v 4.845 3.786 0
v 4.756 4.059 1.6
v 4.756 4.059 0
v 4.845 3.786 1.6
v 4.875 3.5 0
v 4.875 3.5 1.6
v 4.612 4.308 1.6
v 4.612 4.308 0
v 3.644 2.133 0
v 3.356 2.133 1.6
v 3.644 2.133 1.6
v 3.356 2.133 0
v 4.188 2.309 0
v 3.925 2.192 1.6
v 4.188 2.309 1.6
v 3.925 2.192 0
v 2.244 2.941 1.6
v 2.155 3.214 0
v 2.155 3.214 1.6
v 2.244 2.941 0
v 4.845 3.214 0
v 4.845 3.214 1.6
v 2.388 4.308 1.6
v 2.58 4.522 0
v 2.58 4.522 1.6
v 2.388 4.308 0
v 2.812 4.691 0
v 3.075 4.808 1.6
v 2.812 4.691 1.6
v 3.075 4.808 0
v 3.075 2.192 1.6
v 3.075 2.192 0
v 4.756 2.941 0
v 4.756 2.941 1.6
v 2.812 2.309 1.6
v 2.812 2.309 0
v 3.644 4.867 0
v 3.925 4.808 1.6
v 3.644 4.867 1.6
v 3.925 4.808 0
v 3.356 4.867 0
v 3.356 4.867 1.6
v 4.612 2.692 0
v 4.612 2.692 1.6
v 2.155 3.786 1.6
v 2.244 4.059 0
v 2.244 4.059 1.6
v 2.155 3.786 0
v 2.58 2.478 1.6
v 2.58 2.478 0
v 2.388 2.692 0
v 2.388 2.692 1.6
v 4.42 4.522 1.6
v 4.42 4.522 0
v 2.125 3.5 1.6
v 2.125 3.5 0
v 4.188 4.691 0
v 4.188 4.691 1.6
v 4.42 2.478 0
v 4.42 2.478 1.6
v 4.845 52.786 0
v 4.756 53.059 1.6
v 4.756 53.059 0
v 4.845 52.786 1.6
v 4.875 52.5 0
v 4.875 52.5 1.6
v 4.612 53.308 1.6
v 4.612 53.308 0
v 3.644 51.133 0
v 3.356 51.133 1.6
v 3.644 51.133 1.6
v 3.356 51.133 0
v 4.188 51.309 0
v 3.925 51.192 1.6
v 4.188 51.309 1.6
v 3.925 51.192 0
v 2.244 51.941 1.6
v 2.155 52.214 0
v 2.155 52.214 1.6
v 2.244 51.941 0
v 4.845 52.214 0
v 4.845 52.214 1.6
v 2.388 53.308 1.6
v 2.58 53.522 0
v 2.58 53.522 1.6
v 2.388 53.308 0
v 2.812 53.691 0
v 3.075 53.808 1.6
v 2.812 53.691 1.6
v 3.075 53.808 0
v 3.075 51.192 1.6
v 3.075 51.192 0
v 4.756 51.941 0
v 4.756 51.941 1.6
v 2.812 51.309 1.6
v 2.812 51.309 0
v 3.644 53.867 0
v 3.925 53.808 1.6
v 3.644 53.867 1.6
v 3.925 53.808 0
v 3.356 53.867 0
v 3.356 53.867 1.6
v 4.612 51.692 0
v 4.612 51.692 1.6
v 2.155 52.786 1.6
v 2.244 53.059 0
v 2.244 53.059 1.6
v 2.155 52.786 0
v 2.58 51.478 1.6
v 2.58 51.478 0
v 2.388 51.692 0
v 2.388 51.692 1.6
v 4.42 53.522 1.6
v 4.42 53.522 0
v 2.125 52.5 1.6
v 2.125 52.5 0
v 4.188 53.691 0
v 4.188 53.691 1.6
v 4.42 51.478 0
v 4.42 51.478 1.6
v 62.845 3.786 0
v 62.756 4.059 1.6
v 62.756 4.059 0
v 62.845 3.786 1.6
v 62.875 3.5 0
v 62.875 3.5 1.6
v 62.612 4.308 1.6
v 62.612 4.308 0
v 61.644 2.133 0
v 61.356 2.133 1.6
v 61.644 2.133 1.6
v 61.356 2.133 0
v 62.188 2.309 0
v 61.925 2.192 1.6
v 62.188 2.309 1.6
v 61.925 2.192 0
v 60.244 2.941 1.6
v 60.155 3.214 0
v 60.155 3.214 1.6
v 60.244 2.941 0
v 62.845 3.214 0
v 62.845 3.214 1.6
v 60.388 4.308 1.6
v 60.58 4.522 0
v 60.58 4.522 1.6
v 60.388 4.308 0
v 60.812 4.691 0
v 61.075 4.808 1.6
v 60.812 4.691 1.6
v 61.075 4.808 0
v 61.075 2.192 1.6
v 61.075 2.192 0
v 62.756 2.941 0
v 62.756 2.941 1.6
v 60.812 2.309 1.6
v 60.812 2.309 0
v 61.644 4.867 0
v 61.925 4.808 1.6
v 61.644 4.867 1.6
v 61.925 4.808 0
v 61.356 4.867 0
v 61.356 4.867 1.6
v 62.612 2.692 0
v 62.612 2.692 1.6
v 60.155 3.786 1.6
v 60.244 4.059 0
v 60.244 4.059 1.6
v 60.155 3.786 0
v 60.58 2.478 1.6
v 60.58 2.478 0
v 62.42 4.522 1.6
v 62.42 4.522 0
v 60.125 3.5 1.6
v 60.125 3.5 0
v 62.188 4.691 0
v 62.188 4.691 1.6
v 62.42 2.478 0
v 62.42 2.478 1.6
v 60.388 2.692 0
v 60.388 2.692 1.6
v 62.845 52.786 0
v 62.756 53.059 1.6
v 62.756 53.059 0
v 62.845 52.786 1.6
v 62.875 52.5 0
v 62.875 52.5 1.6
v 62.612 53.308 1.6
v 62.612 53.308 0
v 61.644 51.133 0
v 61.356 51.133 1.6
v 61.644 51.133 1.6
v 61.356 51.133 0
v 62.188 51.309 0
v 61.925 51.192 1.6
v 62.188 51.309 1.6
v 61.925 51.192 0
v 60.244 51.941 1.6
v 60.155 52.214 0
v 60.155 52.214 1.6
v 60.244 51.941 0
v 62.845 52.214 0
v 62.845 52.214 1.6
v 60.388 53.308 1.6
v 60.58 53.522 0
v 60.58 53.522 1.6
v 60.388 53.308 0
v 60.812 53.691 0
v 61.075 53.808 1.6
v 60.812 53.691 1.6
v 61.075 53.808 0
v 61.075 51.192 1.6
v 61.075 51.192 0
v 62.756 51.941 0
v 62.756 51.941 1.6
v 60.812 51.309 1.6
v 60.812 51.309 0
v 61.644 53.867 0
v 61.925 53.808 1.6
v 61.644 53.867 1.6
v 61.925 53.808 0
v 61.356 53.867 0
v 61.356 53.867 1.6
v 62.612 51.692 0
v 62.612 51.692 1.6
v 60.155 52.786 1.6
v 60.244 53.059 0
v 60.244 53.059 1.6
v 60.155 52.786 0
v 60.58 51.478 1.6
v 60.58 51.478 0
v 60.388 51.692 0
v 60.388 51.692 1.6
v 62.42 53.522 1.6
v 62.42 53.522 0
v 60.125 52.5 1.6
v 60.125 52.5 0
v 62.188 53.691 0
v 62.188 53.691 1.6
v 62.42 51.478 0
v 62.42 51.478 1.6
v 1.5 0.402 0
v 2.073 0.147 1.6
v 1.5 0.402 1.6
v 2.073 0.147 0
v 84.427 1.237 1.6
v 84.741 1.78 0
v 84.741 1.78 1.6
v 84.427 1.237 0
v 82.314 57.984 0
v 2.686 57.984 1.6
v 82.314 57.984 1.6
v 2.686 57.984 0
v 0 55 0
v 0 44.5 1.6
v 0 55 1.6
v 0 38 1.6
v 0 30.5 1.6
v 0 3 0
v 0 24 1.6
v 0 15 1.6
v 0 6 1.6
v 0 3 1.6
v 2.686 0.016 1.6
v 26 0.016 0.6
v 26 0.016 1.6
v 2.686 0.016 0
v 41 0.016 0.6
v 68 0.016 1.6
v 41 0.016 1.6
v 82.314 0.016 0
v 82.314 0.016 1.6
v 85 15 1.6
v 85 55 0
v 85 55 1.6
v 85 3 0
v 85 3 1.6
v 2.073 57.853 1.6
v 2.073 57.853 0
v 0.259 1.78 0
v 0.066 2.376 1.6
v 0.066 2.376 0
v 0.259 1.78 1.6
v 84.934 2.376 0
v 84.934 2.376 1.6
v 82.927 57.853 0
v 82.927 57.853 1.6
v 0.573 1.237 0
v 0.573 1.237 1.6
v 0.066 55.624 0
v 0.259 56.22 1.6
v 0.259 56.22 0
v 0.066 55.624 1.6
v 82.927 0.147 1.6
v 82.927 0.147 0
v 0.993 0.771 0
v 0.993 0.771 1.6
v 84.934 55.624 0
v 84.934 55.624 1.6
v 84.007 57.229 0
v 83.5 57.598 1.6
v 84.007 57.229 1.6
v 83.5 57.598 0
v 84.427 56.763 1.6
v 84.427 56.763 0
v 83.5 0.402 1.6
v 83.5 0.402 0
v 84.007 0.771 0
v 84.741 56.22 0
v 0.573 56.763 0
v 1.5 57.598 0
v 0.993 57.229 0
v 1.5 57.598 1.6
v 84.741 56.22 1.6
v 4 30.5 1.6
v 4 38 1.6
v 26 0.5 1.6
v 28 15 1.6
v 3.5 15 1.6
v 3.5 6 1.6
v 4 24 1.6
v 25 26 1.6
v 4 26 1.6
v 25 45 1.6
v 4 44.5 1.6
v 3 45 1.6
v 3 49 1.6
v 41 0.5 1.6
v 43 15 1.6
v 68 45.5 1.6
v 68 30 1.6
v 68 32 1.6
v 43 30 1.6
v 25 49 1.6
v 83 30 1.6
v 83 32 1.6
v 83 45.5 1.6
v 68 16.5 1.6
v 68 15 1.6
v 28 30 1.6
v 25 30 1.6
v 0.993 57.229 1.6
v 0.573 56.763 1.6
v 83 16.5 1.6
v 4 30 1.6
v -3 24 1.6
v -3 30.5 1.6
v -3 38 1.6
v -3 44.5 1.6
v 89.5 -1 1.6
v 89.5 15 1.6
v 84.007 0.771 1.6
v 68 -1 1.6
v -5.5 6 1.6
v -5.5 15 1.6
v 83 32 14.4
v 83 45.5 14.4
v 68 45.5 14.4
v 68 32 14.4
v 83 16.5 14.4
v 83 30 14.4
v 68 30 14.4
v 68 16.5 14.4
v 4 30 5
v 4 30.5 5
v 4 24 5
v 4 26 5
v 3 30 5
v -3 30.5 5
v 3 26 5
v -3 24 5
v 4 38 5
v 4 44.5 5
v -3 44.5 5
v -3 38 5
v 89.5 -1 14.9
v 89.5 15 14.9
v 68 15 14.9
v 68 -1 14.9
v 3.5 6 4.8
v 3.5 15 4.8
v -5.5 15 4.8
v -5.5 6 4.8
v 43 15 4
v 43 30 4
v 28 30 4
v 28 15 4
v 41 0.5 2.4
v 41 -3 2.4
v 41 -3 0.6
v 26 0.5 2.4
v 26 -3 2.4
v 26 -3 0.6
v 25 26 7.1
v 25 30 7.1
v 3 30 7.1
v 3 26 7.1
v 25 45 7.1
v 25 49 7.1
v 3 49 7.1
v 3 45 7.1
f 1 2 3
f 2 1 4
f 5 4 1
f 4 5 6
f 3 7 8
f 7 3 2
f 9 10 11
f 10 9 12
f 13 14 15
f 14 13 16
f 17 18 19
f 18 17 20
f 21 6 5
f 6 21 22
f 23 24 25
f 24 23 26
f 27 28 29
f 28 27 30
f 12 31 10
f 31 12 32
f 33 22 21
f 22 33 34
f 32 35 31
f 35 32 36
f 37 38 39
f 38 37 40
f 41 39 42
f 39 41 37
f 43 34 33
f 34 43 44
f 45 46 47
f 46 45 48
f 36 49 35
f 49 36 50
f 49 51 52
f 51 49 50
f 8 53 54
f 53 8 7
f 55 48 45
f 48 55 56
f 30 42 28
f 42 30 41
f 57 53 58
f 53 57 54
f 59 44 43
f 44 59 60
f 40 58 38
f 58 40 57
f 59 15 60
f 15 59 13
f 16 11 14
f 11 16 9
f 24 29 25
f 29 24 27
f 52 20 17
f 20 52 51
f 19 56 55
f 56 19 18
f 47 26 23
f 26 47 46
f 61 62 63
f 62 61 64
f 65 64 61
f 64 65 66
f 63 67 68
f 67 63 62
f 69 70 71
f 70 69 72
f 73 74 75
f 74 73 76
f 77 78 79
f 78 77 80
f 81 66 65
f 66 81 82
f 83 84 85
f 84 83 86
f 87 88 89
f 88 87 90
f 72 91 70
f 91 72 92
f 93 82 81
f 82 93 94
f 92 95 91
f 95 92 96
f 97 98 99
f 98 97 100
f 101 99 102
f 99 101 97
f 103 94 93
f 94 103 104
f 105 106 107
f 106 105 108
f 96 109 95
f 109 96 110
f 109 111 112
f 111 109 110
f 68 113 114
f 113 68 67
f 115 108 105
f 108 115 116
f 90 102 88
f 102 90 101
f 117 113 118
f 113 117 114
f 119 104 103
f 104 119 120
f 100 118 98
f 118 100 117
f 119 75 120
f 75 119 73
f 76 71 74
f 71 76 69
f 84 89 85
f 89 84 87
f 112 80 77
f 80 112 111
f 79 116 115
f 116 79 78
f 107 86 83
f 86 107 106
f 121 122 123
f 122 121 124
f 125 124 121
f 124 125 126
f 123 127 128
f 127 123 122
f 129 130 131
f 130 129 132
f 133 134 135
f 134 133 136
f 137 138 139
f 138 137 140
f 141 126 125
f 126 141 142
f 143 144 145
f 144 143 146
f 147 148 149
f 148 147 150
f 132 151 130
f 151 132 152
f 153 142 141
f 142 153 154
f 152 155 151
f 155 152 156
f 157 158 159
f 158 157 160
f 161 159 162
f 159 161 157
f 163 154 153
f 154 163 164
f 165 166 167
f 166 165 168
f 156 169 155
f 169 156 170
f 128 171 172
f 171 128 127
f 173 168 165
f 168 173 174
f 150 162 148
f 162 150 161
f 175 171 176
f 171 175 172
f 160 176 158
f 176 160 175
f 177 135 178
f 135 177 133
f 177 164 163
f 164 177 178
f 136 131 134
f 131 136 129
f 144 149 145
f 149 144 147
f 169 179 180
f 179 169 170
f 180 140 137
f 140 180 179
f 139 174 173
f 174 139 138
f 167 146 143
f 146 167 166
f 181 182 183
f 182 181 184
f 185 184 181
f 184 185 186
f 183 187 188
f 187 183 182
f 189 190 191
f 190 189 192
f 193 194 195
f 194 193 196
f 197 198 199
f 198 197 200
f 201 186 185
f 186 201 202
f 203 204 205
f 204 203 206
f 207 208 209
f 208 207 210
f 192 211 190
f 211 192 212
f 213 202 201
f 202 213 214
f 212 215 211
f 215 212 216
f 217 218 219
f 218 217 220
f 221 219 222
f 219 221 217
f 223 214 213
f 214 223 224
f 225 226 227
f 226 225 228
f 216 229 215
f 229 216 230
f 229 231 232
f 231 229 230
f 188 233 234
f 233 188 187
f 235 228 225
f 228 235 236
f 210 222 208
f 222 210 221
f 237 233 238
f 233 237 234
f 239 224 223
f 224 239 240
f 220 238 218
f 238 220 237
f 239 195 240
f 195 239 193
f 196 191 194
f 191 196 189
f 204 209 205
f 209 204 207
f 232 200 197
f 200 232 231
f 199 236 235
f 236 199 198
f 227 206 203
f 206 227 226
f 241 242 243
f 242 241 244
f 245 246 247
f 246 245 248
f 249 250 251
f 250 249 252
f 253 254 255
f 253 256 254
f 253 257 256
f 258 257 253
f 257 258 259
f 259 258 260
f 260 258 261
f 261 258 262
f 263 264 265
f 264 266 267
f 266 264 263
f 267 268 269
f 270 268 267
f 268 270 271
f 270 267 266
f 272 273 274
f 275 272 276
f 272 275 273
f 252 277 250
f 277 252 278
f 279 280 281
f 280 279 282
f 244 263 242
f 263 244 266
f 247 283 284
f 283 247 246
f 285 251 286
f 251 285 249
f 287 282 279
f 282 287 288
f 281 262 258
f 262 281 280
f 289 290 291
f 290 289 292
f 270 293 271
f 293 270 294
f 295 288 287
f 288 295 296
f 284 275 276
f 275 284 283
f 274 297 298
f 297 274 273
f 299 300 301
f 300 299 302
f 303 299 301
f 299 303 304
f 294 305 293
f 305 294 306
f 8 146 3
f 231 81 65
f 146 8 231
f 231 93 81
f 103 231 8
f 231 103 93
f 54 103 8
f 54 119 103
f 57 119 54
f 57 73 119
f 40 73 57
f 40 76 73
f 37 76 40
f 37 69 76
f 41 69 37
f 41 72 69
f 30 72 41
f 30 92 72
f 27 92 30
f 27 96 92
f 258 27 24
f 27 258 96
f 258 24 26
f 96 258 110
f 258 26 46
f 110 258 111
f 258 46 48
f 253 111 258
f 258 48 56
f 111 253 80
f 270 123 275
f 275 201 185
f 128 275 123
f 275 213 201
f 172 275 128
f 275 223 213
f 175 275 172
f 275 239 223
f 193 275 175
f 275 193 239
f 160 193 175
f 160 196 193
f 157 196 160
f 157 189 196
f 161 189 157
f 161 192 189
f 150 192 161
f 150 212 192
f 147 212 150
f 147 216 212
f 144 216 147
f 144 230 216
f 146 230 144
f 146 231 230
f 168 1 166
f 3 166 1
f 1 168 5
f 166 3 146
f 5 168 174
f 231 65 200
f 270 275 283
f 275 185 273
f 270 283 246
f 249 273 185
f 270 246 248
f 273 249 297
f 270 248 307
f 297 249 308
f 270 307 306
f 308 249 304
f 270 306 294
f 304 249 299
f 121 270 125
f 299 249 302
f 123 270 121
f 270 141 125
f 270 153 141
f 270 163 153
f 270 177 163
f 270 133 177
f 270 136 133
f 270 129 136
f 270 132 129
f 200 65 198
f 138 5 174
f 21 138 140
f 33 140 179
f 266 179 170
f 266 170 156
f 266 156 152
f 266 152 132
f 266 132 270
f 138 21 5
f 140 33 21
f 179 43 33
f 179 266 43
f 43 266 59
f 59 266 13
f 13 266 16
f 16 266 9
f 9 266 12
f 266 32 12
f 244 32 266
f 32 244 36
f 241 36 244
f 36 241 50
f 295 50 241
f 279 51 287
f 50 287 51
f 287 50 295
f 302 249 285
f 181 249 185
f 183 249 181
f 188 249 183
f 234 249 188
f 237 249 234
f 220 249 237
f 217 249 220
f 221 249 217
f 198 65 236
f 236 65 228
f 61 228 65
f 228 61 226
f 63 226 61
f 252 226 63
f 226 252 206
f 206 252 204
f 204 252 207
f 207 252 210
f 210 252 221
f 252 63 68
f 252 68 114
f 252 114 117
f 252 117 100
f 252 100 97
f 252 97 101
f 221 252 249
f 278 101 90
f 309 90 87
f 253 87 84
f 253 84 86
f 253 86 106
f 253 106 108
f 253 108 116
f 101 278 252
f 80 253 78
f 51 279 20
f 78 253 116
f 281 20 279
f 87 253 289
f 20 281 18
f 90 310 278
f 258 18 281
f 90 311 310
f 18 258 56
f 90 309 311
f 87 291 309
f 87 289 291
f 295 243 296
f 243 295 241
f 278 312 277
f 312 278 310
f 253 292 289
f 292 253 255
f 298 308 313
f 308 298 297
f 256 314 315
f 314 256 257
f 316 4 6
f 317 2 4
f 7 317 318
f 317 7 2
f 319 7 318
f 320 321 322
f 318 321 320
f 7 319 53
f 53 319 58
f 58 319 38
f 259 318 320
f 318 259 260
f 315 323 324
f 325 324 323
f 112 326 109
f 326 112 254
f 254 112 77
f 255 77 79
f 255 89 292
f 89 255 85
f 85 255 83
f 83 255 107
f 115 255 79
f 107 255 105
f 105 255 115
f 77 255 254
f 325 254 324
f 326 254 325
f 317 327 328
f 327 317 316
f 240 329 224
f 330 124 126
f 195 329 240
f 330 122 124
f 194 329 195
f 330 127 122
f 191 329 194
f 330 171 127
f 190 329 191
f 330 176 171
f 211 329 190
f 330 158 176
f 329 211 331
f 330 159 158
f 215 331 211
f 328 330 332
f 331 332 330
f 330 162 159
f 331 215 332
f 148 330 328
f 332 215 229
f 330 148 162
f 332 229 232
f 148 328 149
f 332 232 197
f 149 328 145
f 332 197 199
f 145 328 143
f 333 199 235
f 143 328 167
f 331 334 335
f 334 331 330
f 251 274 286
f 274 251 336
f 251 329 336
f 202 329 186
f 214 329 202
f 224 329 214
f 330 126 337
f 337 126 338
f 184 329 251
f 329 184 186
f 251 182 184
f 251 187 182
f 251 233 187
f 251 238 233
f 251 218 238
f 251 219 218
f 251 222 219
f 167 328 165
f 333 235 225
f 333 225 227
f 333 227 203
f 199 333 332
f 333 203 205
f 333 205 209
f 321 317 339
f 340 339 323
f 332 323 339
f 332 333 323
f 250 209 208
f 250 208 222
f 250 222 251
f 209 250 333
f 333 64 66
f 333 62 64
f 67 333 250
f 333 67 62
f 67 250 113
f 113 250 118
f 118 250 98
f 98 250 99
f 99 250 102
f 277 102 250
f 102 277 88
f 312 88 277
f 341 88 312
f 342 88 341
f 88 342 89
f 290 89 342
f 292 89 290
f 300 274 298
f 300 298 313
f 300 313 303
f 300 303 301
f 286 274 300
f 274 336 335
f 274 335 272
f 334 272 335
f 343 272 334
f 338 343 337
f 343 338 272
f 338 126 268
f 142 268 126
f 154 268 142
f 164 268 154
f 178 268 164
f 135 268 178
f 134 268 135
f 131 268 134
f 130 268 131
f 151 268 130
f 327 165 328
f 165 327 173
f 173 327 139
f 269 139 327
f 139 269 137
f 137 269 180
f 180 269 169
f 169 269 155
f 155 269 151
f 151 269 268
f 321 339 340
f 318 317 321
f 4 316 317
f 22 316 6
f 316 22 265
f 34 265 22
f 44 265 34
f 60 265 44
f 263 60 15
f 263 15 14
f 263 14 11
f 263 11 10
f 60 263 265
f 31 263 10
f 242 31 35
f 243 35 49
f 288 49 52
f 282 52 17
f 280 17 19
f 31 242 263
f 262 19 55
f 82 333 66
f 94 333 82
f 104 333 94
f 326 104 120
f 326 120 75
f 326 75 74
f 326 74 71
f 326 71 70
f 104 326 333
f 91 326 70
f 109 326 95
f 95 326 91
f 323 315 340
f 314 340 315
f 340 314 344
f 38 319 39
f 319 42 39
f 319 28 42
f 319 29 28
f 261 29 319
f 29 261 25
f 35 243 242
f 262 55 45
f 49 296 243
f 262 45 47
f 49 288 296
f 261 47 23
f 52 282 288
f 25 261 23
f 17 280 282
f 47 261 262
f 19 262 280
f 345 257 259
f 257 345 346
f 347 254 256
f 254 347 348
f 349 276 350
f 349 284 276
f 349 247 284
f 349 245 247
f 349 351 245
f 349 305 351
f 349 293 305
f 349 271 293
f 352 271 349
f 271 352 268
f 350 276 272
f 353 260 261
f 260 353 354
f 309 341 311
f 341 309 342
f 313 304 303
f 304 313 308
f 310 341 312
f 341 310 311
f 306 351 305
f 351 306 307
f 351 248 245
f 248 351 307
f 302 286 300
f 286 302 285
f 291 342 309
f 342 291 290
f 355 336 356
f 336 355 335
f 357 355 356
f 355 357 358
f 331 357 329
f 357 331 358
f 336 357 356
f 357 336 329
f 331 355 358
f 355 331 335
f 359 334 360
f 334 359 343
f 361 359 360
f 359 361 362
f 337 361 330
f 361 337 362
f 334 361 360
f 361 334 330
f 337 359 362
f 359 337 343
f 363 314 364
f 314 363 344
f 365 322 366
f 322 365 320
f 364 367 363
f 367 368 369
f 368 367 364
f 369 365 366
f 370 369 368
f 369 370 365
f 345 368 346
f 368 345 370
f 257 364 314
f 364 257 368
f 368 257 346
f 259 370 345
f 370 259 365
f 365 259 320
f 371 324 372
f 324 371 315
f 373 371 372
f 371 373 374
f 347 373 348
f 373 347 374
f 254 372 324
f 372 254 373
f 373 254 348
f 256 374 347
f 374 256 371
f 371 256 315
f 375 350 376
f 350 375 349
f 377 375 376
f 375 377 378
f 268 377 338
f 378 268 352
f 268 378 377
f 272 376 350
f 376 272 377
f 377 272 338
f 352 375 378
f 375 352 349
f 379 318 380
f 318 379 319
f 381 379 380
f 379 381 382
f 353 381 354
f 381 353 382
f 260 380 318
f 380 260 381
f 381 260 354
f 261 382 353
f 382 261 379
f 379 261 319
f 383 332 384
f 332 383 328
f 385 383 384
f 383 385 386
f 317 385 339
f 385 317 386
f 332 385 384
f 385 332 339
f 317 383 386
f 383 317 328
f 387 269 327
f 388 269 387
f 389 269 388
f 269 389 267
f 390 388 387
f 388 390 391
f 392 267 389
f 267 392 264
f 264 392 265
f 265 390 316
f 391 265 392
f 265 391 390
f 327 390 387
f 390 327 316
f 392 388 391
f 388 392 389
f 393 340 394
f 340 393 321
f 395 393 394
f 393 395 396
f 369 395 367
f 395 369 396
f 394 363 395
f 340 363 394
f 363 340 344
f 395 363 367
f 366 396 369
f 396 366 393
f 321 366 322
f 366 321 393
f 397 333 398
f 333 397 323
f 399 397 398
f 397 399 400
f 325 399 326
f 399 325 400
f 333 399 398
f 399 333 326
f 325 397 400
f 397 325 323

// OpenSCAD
// Raspberry Pi 5 OpenSCAD Model
// Basierend auf offiziellen Dimensionen: 85mm x 58mm x ~11mm
// Quelle: Raspberry Pi 5 Mechanical Drawing

// Parameter
board_width = 85;        // mm
board_depth = 58;        // mm  
board_height = 1.6;      // Standard PCB Dicke
corner_radius = 3;       // Eckenradius

// Montagelöcher
hole_diameter = 2.75;    // Bohrungsdurchmesser
hole_positions = [       // [x, y] Positionen der Löcher
    [3.5, 3.5],
    [3.5, 52.5],
    [61.5, 3.5],
    [61.5, 52.5]
];

// Komponenten Höhen
usb_height = 12.8;
ethernet_height = 13.3;
usb_c_height = 3.2;
gpio_height = 8.5;
hdmi_height = 3.4;

module rounded_rect(width, depth, height, radius) {
    hull() {
        for(x = [radius, width - radius])
            for(y = [radius, depth - radius])
                translate([x, y, 0])
                    cylinder(r = radius, h = height, $fn = 30);
    }
}

module mounting_hole(x, y) {
    translate([x, y, -0.1])
        cylinder(d = hole_diameter, h = board_height + 0.2, $fn = 30);
}

module pcb_board() {
    difference() {
        rounded_rect(board_width, board_depth, board_height, corner_radius);
        
        // Montagelöcher
        for(pos = hole_positions) {
            mounting_hole(pos[0], pos[1]);
        }
    }
}

// USB 3.0 Ports (2x)
module usb_ports() {
    color("Silver") {
        // Linker USB Port
        translate([68, 32, board_height])
            cube([15, 13.5, usb_height]);
        
        // Rechter USB Port
        translate([68, 16.5, board_height])
            cube([15, 13.5, usb_height]);
    }
}

// Gigabit Ethernet Port
module ethernet_port() {
    color("Silver")
        translate([68, -1, board_height])
            cube([21.5, 16, ethernet_height]);
}

// USB-C Power Port
module usb_c_port() {
    color("Silver")
        translate([-5.5, 6, board_height])
            cube([9, 9, usb_c_height]);
}

// Micro HDMI Ports (2x)
module hdmi_ports() {
    color("Silver") {
        // HDMI 0
        translate([-3, 24, board_height])
            cube([7, 6.5, hdmi_height]);
        
        // HDMI 1
        translate([-3, 38, board_height])
            cube([7, 6.5, hdmi_height]);
    }
}

// GPIO Header (40 Pin)
module gpio_header() {
    color("Black")
rotate([0,0,90])
        translate([32, -53.5, board_height])
            cube([5.1, 50.5, gpio_height]);
}

// Processor (SoC)
module processor() {
    color("DarkSlateGray")
        translate([28, 15, board_height])
            cube([15, 15, 2.4]);
}

// SD Card Slot
module sd_card_slot() {
    color("Silver")
        translate([26, -3, board_height - 1])
            cube([15, 3.5, 1.8]);
}

// CSI Camera Connector
module camera_connector() {
    color("WhiteSmoke")
        translate([3, 26, board_height])
            cube([22, 4, 5.5]);
}

// DSI Display Connector
module display_connector() {
    color("WhiteSmoke")
        translate([3, 45, board_height])
            cube([22, 4, 5.5]);
}

// Haupt Assembly
module raspberry_pi_5() {
    // PCB
    color("Green")
        pcb_board();
    
    // Komponenten
    usb_ports();
    ethernet_port();
    usb_c_port();
    hdmi_ports();
   // gpio_header();
    processor();
    sd_card_slot();
    camera_connector();
    display_connector();
}

// Render
raspberry_pi_5();
